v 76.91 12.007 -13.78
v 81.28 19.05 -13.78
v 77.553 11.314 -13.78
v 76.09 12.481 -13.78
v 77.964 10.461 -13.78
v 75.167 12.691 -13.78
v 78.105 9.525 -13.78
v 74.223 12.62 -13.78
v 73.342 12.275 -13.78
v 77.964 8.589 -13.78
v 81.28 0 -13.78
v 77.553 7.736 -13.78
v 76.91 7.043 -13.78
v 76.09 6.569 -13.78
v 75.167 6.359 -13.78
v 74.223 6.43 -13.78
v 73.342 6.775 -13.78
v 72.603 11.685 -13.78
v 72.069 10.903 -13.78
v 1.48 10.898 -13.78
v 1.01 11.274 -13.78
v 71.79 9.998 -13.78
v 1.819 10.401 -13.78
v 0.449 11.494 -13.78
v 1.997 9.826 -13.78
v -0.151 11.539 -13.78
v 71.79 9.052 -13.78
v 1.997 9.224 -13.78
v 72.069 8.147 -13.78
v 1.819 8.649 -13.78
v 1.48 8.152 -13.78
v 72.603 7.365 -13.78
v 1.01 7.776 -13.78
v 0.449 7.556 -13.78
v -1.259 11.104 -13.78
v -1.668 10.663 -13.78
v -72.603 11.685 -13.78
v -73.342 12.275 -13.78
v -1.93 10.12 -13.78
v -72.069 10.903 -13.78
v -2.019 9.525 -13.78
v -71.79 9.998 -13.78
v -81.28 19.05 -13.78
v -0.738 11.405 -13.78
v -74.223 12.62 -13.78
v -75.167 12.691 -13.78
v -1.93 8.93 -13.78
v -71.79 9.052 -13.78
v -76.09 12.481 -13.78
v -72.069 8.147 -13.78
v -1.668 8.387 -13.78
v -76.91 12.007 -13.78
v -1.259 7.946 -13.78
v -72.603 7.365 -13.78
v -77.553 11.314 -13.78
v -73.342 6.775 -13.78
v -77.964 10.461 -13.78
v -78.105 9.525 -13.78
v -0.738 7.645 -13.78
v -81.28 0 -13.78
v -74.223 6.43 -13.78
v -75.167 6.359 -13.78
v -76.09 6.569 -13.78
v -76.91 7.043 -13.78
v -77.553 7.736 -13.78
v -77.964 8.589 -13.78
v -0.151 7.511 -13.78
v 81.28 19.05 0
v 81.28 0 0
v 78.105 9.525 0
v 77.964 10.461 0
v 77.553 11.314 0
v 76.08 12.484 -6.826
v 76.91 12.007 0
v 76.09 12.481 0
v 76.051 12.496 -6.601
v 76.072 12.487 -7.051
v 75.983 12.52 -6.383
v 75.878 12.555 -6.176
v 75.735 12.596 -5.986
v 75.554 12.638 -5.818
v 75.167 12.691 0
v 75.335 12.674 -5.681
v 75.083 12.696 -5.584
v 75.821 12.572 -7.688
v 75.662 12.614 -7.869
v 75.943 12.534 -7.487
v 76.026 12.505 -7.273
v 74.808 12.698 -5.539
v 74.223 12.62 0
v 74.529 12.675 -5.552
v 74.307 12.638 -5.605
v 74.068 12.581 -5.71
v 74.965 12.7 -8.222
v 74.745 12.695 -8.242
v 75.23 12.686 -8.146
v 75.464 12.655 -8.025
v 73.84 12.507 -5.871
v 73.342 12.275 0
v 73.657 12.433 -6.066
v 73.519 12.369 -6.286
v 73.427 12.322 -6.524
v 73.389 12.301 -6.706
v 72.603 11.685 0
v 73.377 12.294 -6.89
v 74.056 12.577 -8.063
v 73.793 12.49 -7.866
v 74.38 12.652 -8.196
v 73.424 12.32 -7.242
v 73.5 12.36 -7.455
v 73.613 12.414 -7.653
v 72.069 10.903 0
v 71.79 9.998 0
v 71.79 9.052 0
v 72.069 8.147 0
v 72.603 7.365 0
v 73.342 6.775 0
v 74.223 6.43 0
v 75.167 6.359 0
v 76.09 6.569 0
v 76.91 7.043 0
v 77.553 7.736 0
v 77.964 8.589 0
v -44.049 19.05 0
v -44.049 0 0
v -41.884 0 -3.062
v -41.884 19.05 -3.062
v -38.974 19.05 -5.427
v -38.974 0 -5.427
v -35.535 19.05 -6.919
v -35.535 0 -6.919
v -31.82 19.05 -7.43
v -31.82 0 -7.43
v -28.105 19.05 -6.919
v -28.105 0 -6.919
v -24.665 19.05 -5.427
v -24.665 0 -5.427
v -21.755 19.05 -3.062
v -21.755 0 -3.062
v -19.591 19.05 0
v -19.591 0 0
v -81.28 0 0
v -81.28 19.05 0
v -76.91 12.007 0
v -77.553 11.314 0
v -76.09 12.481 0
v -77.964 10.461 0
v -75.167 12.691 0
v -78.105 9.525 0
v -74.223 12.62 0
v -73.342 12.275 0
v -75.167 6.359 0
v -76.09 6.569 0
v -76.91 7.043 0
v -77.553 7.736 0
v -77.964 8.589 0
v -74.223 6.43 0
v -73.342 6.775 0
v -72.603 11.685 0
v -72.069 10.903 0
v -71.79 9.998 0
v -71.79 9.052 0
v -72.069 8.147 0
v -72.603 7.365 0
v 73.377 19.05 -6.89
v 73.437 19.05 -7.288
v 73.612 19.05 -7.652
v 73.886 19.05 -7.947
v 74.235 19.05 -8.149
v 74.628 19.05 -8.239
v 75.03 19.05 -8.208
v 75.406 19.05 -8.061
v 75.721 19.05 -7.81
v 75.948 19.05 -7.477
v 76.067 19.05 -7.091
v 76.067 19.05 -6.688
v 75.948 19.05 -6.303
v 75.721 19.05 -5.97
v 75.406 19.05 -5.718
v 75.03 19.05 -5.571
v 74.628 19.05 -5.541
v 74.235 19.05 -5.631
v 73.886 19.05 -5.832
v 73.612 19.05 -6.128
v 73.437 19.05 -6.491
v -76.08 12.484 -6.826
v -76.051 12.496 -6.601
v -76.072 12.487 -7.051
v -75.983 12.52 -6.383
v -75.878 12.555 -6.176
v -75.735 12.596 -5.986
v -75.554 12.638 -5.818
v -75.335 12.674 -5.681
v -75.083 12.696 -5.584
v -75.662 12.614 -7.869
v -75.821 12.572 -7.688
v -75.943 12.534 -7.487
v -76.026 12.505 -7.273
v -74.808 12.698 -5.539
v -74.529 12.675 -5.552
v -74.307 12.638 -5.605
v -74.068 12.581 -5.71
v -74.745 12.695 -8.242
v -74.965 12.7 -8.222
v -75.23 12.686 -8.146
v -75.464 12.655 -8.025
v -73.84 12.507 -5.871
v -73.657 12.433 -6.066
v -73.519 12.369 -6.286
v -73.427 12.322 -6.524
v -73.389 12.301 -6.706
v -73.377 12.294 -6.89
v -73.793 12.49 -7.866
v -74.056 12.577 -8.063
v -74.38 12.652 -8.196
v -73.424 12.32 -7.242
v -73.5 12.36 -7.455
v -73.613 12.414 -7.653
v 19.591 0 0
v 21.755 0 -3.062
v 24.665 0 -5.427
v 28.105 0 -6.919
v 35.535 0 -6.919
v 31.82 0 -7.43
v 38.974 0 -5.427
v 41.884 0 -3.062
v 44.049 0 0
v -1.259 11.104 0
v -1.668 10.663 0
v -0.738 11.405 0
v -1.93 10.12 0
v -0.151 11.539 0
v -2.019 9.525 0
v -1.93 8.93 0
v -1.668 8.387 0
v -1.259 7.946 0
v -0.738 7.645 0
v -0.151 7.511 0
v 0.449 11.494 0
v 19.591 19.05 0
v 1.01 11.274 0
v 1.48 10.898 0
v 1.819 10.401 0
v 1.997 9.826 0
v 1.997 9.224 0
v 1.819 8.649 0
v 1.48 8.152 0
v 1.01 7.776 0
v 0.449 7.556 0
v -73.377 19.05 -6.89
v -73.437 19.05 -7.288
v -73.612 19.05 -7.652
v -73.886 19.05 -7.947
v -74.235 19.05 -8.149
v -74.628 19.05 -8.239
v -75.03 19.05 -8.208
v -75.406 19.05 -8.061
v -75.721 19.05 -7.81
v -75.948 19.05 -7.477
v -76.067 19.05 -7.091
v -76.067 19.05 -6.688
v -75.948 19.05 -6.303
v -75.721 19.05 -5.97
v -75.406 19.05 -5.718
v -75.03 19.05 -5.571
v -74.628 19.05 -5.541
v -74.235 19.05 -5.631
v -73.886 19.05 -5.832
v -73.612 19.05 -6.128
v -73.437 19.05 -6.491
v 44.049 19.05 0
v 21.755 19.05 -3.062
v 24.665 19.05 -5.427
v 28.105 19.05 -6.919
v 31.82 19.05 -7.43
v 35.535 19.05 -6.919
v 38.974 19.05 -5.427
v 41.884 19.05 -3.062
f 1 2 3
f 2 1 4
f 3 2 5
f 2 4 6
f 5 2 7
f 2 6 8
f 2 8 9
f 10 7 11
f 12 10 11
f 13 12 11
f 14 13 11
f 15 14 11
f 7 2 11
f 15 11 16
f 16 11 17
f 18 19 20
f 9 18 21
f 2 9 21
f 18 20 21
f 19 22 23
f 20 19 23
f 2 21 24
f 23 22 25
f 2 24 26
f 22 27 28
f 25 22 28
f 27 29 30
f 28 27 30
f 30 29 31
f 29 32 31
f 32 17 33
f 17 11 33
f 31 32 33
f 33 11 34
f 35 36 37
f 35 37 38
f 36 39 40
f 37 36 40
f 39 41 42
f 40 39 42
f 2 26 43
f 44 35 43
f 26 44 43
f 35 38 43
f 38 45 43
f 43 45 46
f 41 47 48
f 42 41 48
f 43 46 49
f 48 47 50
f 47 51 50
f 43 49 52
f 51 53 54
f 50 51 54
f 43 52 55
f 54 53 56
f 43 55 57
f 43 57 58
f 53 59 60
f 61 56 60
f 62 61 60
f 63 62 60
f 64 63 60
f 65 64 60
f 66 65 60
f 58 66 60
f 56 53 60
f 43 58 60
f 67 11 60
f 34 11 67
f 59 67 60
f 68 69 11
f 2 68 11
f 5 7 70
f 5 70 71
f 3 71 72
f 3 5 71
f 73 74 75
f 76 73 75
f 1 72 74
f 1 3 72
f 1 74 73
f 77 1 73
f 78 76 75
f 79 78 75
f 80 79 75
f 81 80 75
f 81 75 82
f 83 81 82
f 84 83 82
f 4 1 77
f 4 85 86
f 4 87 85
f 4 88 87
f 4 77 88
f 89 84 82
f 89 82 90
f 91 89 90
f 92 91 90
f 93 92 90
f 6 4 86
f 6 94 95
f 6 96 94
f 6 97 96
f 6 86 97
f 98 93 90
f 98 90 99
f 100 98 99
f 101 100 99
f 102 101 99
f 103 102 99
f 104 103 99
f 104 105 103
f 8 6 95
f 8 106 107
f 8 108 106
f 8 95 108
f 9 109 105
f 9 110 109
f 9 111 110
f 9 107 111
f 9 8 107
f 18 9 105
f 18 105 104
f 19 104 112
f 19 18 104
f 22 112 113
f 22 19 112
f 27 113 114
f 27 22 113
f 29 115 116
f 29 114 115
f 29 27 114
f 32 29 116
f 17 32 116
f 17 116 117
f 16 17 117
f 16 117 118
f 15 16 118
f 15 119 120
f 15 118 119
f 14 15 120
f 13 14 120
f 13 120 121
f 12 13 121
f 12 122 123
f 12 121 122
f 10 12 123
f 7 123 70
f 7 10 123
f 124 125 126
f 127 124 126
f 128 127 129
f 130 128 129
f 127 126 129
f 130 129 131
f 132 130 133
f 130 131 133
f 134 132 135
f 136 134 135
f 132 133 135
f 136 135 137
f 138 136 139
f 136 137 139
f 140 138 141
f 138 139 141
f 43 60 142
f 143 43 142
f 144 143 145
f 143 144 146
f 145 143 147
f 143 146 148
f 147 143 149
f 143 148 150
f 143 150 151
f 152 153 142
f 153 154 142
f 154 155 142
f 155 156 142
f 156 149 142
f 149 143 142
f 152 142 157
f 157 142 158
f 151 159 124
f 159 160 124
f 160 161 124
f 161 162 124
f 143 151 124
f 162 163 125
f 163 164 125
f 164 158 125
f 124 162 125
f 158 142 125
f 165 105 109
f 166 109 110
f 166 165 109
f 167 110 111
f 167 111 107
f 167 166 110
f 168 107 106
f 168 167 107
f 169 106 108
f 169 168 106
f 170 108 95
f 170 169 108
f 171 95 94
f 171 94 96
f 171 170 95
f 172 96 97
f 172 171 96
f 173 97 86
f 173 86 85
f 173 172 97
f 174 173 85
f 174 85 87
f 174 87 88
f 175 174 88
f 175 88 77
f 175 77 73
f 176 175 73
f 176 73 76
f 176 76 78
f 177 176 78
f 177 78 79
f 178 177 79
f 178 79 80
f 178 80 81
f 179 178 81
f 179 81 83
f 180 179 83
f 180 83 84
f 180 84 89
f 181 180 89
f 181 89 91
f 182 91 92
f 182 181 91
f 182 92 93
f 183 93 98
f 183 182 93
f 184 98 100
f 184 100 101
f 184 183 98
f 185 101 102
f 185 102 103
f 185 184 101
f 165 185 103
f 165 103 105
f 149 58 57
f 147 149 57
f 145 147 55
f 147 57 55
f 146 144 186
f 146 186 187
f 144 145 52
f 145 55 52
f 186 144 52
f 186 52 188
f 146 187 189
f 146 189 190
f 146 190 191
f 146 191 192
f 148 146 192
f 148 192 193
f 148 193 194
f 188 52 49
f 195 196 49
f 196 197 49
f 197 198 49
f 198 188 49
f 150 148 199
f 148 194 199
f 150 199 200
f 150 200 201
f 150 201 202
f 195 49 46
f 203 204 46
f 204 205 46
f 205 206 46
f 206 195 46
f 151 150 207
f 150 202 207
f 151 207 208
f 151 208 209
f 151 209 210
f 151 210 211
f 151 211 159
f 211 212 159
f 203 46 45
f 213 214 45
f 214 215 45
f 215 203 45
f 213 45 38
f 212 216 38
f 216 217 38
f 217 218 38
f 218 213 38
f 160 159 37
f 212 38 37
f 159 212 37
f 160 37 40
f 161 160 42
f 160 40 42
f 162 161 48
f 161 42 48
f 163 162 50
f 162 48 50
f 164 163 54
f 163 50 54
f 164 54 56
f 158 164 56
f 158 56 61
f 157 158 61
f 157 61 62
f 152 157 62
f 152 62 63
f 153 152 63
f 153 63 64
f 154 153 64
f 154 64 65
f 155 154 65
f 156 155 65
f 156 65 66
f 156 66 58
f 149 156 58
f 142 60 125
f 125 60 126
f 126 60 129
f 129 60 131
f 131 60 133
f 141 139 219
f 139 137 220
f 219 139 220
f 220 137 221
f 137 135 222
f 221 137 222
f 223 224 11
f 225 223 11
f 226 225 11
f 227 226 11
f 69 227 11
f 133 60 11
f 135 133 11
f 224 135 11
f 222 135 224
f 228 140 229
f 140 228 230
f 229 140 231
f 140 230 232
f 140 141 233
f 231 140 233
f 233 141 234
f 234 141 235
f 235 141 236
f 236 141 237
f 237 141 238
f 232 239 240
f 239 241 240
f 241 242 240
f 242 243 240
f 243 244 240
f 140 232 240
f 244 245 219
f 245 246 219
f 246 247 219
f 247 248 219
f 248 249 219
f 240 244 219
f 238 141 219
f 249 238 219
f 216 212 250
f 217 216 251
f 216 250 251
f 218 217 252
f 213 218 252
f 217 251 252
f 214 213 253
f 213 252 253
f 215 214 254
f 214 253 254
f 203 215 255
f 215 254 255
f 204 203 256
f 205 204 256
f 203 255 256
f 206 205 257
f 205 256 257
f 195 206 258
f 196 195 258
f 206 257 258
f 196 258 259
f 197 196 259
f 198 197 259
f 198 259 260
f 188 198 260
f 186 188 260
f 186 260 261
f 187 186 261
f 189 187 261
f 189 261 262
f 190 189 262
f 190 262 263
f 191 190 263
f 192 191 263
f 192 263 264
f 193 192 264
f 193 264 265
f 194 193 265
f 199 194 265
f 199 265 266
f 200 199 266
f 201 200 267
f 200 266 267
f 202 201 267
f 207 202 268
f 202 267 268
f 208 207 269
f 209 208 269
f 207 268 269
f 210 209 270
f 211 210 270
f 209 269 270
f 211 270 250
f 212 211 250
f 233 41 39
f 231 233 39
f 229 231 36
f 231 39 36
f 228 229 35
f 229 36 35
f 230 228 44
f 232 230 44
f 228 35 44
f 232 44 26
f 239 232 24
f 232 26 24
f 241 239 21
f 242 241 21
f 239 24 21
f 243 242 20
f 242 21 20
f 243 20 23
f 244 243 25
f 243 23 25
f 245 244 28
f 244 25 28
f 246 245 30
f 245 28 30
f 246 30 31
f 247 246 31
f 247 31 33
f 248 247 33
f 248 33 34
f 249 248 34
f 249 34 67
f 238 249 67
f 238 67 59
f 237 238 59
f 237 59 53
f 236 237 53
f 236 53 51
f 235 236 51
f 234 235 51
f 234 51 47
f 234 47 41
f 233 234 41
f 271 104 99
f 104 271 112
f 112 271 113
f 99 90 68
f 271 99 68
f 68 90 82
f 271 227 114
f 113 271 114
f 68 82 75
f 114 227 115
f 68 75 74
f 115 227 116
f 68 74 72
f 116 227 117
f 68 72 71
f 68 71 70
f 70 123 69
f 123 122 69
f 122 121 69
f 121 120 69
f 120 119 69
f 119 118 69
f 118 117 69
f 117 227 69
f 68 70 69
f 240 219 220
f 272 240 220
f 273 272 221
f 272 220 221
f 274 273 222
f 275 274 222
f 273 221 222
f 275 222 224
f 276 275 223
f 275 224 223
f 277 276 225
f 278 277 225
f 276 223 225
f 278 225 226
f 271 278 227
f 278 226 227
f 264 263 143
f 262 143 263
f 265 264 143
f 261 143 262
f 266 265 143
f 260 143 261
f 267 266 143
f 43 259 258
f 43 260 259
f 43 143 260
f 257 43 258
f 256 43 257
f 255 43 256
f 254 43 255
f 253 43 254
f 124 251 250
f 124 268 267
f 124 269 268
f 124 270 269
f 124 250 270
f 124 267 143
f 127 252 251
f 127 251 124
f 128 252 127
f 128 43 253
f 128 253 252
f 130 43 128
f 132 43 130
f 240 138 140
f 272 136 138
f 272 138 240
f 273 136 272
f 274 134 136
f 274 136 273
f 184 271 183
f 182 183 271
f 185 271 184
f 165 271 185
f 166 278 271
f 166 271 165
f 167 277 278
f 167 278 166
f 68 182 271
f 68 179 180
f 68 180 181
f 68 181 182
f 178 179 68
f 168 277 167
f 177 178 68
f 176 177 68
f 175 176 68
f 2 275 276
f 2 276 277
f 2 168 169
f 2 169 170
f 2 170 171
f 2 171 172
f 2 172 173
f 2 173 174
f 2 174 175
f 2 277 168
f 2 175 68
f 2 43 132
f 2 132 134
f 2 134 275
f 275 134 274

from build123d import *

# Parameters (mm, degrees)
BOSS_EXTRUDE1_DEPTH         = 19.05
F_1_4_0_25_DIAMETER_HOLE1_D = 6.35
F_6_32_TAPPED_HOLE1_REACH   = 86.612
F_6_32_TAPPED_HOLE1_BORE_R  = 1.35255
F_10_32_TAPPED_HOLE1_D      = 4.0386


with BuildPart() as part:
    # Sketch1 → Boss-Extrude1 (new body)
    with BuildSketch(Plane(origin=(0, 0, 0), x_dir=(1, 0, 0), z_dir=(0, 1, 0))):
        with BuildLine():
            Line((-19.59069957, 0), (19.59069957, 0))
            ThreePointArc((19.59069957, 0), (31.81985, 7.4295), (44.04900043, 0))
            Line((44.04900043, 0), (81.28, 0))
            Line((81.28, 0), (81.28, 13.7795))
            Line((81.28, 13.7795), (-81.28, 13.7795))
            Line((-81.28, 13.7795), (-81.28, 0))
            Line((-81.28, 0), (-44.04900043, 0))
            ThreePointArc((-44.04900043, 0), (-31.81985, 7.4295), (-19.59069957, 0))
        make_face()
    extrude(amount=BOSS_EXTRUDE1_DEPTH)

    # 1/4 (0.25) Diameter Hole1 (through all)
    with Locations(Plane.XY):
        with Locations((-74.93, 9.525)):
            f_1_4_0_25_diameter_hole1 = Hole(F_1_4_0_25_DIAMETER_HOLE1_D / 2)

    # #6-32 Tapped Hole1 bore → #6-32 Tapped Hole1 (cut, up to next)
    with BuildSketch(Plane(origin=(0, 19.05, 0), x_dir=(1, 0, 0), z_dir=(0, 1, 0)), mode=Mode.PRIVATE) as f_6_32_tapped_hole1_sk1:
        with Locations((-74.72934, 6.88975)):
            Circle(F_6_32_TAPPED_HOLE1_BORE_R)
    f_6_32_tapped_hole1_tool1 = extrude(f_6_32_tapped_hole1_sk1.sketch, amount=-F_6_32_TAPPED_HOLE1_REACH, mode=Mode.PRIVATE) & part.part
    f_6_32_tapped_hole1 = f_6_32_tapped_hole1_tool1.solids().sort_by_distance((-74.72934, 19.05, -6.88975))[0]
    add(f_6_32_tapped_hole1, mode=Mode.SUBTRACT)

    # Mirror2: 1/4 (0.25) Diameter Hole1, #6-32 Tapped Hole1 across plane
    add(f_1_4_0_25_diameter_hole1.mirror(Plane(origin=(0, 0, 0), x_dir=(0, 0, 1), z_dir=(1, 0, 0))), mode=Mode.SUBTRACT)
    add(f_6_32_tapped_hole1.mirror(Plane(origin=(0, 0, 0), x_dir=(0, 0, 1), z_dir=(1, 0, 0))), mode=Mode.SUBTRACT)

    # #10-32 Tapped Hole1 (through all)
    with Locations(Plane.XY):
        with Locations((0, 9.525)):
            Hole(F_10_32_TAPPED_HOLE1_D / 2)


solid = part.part
